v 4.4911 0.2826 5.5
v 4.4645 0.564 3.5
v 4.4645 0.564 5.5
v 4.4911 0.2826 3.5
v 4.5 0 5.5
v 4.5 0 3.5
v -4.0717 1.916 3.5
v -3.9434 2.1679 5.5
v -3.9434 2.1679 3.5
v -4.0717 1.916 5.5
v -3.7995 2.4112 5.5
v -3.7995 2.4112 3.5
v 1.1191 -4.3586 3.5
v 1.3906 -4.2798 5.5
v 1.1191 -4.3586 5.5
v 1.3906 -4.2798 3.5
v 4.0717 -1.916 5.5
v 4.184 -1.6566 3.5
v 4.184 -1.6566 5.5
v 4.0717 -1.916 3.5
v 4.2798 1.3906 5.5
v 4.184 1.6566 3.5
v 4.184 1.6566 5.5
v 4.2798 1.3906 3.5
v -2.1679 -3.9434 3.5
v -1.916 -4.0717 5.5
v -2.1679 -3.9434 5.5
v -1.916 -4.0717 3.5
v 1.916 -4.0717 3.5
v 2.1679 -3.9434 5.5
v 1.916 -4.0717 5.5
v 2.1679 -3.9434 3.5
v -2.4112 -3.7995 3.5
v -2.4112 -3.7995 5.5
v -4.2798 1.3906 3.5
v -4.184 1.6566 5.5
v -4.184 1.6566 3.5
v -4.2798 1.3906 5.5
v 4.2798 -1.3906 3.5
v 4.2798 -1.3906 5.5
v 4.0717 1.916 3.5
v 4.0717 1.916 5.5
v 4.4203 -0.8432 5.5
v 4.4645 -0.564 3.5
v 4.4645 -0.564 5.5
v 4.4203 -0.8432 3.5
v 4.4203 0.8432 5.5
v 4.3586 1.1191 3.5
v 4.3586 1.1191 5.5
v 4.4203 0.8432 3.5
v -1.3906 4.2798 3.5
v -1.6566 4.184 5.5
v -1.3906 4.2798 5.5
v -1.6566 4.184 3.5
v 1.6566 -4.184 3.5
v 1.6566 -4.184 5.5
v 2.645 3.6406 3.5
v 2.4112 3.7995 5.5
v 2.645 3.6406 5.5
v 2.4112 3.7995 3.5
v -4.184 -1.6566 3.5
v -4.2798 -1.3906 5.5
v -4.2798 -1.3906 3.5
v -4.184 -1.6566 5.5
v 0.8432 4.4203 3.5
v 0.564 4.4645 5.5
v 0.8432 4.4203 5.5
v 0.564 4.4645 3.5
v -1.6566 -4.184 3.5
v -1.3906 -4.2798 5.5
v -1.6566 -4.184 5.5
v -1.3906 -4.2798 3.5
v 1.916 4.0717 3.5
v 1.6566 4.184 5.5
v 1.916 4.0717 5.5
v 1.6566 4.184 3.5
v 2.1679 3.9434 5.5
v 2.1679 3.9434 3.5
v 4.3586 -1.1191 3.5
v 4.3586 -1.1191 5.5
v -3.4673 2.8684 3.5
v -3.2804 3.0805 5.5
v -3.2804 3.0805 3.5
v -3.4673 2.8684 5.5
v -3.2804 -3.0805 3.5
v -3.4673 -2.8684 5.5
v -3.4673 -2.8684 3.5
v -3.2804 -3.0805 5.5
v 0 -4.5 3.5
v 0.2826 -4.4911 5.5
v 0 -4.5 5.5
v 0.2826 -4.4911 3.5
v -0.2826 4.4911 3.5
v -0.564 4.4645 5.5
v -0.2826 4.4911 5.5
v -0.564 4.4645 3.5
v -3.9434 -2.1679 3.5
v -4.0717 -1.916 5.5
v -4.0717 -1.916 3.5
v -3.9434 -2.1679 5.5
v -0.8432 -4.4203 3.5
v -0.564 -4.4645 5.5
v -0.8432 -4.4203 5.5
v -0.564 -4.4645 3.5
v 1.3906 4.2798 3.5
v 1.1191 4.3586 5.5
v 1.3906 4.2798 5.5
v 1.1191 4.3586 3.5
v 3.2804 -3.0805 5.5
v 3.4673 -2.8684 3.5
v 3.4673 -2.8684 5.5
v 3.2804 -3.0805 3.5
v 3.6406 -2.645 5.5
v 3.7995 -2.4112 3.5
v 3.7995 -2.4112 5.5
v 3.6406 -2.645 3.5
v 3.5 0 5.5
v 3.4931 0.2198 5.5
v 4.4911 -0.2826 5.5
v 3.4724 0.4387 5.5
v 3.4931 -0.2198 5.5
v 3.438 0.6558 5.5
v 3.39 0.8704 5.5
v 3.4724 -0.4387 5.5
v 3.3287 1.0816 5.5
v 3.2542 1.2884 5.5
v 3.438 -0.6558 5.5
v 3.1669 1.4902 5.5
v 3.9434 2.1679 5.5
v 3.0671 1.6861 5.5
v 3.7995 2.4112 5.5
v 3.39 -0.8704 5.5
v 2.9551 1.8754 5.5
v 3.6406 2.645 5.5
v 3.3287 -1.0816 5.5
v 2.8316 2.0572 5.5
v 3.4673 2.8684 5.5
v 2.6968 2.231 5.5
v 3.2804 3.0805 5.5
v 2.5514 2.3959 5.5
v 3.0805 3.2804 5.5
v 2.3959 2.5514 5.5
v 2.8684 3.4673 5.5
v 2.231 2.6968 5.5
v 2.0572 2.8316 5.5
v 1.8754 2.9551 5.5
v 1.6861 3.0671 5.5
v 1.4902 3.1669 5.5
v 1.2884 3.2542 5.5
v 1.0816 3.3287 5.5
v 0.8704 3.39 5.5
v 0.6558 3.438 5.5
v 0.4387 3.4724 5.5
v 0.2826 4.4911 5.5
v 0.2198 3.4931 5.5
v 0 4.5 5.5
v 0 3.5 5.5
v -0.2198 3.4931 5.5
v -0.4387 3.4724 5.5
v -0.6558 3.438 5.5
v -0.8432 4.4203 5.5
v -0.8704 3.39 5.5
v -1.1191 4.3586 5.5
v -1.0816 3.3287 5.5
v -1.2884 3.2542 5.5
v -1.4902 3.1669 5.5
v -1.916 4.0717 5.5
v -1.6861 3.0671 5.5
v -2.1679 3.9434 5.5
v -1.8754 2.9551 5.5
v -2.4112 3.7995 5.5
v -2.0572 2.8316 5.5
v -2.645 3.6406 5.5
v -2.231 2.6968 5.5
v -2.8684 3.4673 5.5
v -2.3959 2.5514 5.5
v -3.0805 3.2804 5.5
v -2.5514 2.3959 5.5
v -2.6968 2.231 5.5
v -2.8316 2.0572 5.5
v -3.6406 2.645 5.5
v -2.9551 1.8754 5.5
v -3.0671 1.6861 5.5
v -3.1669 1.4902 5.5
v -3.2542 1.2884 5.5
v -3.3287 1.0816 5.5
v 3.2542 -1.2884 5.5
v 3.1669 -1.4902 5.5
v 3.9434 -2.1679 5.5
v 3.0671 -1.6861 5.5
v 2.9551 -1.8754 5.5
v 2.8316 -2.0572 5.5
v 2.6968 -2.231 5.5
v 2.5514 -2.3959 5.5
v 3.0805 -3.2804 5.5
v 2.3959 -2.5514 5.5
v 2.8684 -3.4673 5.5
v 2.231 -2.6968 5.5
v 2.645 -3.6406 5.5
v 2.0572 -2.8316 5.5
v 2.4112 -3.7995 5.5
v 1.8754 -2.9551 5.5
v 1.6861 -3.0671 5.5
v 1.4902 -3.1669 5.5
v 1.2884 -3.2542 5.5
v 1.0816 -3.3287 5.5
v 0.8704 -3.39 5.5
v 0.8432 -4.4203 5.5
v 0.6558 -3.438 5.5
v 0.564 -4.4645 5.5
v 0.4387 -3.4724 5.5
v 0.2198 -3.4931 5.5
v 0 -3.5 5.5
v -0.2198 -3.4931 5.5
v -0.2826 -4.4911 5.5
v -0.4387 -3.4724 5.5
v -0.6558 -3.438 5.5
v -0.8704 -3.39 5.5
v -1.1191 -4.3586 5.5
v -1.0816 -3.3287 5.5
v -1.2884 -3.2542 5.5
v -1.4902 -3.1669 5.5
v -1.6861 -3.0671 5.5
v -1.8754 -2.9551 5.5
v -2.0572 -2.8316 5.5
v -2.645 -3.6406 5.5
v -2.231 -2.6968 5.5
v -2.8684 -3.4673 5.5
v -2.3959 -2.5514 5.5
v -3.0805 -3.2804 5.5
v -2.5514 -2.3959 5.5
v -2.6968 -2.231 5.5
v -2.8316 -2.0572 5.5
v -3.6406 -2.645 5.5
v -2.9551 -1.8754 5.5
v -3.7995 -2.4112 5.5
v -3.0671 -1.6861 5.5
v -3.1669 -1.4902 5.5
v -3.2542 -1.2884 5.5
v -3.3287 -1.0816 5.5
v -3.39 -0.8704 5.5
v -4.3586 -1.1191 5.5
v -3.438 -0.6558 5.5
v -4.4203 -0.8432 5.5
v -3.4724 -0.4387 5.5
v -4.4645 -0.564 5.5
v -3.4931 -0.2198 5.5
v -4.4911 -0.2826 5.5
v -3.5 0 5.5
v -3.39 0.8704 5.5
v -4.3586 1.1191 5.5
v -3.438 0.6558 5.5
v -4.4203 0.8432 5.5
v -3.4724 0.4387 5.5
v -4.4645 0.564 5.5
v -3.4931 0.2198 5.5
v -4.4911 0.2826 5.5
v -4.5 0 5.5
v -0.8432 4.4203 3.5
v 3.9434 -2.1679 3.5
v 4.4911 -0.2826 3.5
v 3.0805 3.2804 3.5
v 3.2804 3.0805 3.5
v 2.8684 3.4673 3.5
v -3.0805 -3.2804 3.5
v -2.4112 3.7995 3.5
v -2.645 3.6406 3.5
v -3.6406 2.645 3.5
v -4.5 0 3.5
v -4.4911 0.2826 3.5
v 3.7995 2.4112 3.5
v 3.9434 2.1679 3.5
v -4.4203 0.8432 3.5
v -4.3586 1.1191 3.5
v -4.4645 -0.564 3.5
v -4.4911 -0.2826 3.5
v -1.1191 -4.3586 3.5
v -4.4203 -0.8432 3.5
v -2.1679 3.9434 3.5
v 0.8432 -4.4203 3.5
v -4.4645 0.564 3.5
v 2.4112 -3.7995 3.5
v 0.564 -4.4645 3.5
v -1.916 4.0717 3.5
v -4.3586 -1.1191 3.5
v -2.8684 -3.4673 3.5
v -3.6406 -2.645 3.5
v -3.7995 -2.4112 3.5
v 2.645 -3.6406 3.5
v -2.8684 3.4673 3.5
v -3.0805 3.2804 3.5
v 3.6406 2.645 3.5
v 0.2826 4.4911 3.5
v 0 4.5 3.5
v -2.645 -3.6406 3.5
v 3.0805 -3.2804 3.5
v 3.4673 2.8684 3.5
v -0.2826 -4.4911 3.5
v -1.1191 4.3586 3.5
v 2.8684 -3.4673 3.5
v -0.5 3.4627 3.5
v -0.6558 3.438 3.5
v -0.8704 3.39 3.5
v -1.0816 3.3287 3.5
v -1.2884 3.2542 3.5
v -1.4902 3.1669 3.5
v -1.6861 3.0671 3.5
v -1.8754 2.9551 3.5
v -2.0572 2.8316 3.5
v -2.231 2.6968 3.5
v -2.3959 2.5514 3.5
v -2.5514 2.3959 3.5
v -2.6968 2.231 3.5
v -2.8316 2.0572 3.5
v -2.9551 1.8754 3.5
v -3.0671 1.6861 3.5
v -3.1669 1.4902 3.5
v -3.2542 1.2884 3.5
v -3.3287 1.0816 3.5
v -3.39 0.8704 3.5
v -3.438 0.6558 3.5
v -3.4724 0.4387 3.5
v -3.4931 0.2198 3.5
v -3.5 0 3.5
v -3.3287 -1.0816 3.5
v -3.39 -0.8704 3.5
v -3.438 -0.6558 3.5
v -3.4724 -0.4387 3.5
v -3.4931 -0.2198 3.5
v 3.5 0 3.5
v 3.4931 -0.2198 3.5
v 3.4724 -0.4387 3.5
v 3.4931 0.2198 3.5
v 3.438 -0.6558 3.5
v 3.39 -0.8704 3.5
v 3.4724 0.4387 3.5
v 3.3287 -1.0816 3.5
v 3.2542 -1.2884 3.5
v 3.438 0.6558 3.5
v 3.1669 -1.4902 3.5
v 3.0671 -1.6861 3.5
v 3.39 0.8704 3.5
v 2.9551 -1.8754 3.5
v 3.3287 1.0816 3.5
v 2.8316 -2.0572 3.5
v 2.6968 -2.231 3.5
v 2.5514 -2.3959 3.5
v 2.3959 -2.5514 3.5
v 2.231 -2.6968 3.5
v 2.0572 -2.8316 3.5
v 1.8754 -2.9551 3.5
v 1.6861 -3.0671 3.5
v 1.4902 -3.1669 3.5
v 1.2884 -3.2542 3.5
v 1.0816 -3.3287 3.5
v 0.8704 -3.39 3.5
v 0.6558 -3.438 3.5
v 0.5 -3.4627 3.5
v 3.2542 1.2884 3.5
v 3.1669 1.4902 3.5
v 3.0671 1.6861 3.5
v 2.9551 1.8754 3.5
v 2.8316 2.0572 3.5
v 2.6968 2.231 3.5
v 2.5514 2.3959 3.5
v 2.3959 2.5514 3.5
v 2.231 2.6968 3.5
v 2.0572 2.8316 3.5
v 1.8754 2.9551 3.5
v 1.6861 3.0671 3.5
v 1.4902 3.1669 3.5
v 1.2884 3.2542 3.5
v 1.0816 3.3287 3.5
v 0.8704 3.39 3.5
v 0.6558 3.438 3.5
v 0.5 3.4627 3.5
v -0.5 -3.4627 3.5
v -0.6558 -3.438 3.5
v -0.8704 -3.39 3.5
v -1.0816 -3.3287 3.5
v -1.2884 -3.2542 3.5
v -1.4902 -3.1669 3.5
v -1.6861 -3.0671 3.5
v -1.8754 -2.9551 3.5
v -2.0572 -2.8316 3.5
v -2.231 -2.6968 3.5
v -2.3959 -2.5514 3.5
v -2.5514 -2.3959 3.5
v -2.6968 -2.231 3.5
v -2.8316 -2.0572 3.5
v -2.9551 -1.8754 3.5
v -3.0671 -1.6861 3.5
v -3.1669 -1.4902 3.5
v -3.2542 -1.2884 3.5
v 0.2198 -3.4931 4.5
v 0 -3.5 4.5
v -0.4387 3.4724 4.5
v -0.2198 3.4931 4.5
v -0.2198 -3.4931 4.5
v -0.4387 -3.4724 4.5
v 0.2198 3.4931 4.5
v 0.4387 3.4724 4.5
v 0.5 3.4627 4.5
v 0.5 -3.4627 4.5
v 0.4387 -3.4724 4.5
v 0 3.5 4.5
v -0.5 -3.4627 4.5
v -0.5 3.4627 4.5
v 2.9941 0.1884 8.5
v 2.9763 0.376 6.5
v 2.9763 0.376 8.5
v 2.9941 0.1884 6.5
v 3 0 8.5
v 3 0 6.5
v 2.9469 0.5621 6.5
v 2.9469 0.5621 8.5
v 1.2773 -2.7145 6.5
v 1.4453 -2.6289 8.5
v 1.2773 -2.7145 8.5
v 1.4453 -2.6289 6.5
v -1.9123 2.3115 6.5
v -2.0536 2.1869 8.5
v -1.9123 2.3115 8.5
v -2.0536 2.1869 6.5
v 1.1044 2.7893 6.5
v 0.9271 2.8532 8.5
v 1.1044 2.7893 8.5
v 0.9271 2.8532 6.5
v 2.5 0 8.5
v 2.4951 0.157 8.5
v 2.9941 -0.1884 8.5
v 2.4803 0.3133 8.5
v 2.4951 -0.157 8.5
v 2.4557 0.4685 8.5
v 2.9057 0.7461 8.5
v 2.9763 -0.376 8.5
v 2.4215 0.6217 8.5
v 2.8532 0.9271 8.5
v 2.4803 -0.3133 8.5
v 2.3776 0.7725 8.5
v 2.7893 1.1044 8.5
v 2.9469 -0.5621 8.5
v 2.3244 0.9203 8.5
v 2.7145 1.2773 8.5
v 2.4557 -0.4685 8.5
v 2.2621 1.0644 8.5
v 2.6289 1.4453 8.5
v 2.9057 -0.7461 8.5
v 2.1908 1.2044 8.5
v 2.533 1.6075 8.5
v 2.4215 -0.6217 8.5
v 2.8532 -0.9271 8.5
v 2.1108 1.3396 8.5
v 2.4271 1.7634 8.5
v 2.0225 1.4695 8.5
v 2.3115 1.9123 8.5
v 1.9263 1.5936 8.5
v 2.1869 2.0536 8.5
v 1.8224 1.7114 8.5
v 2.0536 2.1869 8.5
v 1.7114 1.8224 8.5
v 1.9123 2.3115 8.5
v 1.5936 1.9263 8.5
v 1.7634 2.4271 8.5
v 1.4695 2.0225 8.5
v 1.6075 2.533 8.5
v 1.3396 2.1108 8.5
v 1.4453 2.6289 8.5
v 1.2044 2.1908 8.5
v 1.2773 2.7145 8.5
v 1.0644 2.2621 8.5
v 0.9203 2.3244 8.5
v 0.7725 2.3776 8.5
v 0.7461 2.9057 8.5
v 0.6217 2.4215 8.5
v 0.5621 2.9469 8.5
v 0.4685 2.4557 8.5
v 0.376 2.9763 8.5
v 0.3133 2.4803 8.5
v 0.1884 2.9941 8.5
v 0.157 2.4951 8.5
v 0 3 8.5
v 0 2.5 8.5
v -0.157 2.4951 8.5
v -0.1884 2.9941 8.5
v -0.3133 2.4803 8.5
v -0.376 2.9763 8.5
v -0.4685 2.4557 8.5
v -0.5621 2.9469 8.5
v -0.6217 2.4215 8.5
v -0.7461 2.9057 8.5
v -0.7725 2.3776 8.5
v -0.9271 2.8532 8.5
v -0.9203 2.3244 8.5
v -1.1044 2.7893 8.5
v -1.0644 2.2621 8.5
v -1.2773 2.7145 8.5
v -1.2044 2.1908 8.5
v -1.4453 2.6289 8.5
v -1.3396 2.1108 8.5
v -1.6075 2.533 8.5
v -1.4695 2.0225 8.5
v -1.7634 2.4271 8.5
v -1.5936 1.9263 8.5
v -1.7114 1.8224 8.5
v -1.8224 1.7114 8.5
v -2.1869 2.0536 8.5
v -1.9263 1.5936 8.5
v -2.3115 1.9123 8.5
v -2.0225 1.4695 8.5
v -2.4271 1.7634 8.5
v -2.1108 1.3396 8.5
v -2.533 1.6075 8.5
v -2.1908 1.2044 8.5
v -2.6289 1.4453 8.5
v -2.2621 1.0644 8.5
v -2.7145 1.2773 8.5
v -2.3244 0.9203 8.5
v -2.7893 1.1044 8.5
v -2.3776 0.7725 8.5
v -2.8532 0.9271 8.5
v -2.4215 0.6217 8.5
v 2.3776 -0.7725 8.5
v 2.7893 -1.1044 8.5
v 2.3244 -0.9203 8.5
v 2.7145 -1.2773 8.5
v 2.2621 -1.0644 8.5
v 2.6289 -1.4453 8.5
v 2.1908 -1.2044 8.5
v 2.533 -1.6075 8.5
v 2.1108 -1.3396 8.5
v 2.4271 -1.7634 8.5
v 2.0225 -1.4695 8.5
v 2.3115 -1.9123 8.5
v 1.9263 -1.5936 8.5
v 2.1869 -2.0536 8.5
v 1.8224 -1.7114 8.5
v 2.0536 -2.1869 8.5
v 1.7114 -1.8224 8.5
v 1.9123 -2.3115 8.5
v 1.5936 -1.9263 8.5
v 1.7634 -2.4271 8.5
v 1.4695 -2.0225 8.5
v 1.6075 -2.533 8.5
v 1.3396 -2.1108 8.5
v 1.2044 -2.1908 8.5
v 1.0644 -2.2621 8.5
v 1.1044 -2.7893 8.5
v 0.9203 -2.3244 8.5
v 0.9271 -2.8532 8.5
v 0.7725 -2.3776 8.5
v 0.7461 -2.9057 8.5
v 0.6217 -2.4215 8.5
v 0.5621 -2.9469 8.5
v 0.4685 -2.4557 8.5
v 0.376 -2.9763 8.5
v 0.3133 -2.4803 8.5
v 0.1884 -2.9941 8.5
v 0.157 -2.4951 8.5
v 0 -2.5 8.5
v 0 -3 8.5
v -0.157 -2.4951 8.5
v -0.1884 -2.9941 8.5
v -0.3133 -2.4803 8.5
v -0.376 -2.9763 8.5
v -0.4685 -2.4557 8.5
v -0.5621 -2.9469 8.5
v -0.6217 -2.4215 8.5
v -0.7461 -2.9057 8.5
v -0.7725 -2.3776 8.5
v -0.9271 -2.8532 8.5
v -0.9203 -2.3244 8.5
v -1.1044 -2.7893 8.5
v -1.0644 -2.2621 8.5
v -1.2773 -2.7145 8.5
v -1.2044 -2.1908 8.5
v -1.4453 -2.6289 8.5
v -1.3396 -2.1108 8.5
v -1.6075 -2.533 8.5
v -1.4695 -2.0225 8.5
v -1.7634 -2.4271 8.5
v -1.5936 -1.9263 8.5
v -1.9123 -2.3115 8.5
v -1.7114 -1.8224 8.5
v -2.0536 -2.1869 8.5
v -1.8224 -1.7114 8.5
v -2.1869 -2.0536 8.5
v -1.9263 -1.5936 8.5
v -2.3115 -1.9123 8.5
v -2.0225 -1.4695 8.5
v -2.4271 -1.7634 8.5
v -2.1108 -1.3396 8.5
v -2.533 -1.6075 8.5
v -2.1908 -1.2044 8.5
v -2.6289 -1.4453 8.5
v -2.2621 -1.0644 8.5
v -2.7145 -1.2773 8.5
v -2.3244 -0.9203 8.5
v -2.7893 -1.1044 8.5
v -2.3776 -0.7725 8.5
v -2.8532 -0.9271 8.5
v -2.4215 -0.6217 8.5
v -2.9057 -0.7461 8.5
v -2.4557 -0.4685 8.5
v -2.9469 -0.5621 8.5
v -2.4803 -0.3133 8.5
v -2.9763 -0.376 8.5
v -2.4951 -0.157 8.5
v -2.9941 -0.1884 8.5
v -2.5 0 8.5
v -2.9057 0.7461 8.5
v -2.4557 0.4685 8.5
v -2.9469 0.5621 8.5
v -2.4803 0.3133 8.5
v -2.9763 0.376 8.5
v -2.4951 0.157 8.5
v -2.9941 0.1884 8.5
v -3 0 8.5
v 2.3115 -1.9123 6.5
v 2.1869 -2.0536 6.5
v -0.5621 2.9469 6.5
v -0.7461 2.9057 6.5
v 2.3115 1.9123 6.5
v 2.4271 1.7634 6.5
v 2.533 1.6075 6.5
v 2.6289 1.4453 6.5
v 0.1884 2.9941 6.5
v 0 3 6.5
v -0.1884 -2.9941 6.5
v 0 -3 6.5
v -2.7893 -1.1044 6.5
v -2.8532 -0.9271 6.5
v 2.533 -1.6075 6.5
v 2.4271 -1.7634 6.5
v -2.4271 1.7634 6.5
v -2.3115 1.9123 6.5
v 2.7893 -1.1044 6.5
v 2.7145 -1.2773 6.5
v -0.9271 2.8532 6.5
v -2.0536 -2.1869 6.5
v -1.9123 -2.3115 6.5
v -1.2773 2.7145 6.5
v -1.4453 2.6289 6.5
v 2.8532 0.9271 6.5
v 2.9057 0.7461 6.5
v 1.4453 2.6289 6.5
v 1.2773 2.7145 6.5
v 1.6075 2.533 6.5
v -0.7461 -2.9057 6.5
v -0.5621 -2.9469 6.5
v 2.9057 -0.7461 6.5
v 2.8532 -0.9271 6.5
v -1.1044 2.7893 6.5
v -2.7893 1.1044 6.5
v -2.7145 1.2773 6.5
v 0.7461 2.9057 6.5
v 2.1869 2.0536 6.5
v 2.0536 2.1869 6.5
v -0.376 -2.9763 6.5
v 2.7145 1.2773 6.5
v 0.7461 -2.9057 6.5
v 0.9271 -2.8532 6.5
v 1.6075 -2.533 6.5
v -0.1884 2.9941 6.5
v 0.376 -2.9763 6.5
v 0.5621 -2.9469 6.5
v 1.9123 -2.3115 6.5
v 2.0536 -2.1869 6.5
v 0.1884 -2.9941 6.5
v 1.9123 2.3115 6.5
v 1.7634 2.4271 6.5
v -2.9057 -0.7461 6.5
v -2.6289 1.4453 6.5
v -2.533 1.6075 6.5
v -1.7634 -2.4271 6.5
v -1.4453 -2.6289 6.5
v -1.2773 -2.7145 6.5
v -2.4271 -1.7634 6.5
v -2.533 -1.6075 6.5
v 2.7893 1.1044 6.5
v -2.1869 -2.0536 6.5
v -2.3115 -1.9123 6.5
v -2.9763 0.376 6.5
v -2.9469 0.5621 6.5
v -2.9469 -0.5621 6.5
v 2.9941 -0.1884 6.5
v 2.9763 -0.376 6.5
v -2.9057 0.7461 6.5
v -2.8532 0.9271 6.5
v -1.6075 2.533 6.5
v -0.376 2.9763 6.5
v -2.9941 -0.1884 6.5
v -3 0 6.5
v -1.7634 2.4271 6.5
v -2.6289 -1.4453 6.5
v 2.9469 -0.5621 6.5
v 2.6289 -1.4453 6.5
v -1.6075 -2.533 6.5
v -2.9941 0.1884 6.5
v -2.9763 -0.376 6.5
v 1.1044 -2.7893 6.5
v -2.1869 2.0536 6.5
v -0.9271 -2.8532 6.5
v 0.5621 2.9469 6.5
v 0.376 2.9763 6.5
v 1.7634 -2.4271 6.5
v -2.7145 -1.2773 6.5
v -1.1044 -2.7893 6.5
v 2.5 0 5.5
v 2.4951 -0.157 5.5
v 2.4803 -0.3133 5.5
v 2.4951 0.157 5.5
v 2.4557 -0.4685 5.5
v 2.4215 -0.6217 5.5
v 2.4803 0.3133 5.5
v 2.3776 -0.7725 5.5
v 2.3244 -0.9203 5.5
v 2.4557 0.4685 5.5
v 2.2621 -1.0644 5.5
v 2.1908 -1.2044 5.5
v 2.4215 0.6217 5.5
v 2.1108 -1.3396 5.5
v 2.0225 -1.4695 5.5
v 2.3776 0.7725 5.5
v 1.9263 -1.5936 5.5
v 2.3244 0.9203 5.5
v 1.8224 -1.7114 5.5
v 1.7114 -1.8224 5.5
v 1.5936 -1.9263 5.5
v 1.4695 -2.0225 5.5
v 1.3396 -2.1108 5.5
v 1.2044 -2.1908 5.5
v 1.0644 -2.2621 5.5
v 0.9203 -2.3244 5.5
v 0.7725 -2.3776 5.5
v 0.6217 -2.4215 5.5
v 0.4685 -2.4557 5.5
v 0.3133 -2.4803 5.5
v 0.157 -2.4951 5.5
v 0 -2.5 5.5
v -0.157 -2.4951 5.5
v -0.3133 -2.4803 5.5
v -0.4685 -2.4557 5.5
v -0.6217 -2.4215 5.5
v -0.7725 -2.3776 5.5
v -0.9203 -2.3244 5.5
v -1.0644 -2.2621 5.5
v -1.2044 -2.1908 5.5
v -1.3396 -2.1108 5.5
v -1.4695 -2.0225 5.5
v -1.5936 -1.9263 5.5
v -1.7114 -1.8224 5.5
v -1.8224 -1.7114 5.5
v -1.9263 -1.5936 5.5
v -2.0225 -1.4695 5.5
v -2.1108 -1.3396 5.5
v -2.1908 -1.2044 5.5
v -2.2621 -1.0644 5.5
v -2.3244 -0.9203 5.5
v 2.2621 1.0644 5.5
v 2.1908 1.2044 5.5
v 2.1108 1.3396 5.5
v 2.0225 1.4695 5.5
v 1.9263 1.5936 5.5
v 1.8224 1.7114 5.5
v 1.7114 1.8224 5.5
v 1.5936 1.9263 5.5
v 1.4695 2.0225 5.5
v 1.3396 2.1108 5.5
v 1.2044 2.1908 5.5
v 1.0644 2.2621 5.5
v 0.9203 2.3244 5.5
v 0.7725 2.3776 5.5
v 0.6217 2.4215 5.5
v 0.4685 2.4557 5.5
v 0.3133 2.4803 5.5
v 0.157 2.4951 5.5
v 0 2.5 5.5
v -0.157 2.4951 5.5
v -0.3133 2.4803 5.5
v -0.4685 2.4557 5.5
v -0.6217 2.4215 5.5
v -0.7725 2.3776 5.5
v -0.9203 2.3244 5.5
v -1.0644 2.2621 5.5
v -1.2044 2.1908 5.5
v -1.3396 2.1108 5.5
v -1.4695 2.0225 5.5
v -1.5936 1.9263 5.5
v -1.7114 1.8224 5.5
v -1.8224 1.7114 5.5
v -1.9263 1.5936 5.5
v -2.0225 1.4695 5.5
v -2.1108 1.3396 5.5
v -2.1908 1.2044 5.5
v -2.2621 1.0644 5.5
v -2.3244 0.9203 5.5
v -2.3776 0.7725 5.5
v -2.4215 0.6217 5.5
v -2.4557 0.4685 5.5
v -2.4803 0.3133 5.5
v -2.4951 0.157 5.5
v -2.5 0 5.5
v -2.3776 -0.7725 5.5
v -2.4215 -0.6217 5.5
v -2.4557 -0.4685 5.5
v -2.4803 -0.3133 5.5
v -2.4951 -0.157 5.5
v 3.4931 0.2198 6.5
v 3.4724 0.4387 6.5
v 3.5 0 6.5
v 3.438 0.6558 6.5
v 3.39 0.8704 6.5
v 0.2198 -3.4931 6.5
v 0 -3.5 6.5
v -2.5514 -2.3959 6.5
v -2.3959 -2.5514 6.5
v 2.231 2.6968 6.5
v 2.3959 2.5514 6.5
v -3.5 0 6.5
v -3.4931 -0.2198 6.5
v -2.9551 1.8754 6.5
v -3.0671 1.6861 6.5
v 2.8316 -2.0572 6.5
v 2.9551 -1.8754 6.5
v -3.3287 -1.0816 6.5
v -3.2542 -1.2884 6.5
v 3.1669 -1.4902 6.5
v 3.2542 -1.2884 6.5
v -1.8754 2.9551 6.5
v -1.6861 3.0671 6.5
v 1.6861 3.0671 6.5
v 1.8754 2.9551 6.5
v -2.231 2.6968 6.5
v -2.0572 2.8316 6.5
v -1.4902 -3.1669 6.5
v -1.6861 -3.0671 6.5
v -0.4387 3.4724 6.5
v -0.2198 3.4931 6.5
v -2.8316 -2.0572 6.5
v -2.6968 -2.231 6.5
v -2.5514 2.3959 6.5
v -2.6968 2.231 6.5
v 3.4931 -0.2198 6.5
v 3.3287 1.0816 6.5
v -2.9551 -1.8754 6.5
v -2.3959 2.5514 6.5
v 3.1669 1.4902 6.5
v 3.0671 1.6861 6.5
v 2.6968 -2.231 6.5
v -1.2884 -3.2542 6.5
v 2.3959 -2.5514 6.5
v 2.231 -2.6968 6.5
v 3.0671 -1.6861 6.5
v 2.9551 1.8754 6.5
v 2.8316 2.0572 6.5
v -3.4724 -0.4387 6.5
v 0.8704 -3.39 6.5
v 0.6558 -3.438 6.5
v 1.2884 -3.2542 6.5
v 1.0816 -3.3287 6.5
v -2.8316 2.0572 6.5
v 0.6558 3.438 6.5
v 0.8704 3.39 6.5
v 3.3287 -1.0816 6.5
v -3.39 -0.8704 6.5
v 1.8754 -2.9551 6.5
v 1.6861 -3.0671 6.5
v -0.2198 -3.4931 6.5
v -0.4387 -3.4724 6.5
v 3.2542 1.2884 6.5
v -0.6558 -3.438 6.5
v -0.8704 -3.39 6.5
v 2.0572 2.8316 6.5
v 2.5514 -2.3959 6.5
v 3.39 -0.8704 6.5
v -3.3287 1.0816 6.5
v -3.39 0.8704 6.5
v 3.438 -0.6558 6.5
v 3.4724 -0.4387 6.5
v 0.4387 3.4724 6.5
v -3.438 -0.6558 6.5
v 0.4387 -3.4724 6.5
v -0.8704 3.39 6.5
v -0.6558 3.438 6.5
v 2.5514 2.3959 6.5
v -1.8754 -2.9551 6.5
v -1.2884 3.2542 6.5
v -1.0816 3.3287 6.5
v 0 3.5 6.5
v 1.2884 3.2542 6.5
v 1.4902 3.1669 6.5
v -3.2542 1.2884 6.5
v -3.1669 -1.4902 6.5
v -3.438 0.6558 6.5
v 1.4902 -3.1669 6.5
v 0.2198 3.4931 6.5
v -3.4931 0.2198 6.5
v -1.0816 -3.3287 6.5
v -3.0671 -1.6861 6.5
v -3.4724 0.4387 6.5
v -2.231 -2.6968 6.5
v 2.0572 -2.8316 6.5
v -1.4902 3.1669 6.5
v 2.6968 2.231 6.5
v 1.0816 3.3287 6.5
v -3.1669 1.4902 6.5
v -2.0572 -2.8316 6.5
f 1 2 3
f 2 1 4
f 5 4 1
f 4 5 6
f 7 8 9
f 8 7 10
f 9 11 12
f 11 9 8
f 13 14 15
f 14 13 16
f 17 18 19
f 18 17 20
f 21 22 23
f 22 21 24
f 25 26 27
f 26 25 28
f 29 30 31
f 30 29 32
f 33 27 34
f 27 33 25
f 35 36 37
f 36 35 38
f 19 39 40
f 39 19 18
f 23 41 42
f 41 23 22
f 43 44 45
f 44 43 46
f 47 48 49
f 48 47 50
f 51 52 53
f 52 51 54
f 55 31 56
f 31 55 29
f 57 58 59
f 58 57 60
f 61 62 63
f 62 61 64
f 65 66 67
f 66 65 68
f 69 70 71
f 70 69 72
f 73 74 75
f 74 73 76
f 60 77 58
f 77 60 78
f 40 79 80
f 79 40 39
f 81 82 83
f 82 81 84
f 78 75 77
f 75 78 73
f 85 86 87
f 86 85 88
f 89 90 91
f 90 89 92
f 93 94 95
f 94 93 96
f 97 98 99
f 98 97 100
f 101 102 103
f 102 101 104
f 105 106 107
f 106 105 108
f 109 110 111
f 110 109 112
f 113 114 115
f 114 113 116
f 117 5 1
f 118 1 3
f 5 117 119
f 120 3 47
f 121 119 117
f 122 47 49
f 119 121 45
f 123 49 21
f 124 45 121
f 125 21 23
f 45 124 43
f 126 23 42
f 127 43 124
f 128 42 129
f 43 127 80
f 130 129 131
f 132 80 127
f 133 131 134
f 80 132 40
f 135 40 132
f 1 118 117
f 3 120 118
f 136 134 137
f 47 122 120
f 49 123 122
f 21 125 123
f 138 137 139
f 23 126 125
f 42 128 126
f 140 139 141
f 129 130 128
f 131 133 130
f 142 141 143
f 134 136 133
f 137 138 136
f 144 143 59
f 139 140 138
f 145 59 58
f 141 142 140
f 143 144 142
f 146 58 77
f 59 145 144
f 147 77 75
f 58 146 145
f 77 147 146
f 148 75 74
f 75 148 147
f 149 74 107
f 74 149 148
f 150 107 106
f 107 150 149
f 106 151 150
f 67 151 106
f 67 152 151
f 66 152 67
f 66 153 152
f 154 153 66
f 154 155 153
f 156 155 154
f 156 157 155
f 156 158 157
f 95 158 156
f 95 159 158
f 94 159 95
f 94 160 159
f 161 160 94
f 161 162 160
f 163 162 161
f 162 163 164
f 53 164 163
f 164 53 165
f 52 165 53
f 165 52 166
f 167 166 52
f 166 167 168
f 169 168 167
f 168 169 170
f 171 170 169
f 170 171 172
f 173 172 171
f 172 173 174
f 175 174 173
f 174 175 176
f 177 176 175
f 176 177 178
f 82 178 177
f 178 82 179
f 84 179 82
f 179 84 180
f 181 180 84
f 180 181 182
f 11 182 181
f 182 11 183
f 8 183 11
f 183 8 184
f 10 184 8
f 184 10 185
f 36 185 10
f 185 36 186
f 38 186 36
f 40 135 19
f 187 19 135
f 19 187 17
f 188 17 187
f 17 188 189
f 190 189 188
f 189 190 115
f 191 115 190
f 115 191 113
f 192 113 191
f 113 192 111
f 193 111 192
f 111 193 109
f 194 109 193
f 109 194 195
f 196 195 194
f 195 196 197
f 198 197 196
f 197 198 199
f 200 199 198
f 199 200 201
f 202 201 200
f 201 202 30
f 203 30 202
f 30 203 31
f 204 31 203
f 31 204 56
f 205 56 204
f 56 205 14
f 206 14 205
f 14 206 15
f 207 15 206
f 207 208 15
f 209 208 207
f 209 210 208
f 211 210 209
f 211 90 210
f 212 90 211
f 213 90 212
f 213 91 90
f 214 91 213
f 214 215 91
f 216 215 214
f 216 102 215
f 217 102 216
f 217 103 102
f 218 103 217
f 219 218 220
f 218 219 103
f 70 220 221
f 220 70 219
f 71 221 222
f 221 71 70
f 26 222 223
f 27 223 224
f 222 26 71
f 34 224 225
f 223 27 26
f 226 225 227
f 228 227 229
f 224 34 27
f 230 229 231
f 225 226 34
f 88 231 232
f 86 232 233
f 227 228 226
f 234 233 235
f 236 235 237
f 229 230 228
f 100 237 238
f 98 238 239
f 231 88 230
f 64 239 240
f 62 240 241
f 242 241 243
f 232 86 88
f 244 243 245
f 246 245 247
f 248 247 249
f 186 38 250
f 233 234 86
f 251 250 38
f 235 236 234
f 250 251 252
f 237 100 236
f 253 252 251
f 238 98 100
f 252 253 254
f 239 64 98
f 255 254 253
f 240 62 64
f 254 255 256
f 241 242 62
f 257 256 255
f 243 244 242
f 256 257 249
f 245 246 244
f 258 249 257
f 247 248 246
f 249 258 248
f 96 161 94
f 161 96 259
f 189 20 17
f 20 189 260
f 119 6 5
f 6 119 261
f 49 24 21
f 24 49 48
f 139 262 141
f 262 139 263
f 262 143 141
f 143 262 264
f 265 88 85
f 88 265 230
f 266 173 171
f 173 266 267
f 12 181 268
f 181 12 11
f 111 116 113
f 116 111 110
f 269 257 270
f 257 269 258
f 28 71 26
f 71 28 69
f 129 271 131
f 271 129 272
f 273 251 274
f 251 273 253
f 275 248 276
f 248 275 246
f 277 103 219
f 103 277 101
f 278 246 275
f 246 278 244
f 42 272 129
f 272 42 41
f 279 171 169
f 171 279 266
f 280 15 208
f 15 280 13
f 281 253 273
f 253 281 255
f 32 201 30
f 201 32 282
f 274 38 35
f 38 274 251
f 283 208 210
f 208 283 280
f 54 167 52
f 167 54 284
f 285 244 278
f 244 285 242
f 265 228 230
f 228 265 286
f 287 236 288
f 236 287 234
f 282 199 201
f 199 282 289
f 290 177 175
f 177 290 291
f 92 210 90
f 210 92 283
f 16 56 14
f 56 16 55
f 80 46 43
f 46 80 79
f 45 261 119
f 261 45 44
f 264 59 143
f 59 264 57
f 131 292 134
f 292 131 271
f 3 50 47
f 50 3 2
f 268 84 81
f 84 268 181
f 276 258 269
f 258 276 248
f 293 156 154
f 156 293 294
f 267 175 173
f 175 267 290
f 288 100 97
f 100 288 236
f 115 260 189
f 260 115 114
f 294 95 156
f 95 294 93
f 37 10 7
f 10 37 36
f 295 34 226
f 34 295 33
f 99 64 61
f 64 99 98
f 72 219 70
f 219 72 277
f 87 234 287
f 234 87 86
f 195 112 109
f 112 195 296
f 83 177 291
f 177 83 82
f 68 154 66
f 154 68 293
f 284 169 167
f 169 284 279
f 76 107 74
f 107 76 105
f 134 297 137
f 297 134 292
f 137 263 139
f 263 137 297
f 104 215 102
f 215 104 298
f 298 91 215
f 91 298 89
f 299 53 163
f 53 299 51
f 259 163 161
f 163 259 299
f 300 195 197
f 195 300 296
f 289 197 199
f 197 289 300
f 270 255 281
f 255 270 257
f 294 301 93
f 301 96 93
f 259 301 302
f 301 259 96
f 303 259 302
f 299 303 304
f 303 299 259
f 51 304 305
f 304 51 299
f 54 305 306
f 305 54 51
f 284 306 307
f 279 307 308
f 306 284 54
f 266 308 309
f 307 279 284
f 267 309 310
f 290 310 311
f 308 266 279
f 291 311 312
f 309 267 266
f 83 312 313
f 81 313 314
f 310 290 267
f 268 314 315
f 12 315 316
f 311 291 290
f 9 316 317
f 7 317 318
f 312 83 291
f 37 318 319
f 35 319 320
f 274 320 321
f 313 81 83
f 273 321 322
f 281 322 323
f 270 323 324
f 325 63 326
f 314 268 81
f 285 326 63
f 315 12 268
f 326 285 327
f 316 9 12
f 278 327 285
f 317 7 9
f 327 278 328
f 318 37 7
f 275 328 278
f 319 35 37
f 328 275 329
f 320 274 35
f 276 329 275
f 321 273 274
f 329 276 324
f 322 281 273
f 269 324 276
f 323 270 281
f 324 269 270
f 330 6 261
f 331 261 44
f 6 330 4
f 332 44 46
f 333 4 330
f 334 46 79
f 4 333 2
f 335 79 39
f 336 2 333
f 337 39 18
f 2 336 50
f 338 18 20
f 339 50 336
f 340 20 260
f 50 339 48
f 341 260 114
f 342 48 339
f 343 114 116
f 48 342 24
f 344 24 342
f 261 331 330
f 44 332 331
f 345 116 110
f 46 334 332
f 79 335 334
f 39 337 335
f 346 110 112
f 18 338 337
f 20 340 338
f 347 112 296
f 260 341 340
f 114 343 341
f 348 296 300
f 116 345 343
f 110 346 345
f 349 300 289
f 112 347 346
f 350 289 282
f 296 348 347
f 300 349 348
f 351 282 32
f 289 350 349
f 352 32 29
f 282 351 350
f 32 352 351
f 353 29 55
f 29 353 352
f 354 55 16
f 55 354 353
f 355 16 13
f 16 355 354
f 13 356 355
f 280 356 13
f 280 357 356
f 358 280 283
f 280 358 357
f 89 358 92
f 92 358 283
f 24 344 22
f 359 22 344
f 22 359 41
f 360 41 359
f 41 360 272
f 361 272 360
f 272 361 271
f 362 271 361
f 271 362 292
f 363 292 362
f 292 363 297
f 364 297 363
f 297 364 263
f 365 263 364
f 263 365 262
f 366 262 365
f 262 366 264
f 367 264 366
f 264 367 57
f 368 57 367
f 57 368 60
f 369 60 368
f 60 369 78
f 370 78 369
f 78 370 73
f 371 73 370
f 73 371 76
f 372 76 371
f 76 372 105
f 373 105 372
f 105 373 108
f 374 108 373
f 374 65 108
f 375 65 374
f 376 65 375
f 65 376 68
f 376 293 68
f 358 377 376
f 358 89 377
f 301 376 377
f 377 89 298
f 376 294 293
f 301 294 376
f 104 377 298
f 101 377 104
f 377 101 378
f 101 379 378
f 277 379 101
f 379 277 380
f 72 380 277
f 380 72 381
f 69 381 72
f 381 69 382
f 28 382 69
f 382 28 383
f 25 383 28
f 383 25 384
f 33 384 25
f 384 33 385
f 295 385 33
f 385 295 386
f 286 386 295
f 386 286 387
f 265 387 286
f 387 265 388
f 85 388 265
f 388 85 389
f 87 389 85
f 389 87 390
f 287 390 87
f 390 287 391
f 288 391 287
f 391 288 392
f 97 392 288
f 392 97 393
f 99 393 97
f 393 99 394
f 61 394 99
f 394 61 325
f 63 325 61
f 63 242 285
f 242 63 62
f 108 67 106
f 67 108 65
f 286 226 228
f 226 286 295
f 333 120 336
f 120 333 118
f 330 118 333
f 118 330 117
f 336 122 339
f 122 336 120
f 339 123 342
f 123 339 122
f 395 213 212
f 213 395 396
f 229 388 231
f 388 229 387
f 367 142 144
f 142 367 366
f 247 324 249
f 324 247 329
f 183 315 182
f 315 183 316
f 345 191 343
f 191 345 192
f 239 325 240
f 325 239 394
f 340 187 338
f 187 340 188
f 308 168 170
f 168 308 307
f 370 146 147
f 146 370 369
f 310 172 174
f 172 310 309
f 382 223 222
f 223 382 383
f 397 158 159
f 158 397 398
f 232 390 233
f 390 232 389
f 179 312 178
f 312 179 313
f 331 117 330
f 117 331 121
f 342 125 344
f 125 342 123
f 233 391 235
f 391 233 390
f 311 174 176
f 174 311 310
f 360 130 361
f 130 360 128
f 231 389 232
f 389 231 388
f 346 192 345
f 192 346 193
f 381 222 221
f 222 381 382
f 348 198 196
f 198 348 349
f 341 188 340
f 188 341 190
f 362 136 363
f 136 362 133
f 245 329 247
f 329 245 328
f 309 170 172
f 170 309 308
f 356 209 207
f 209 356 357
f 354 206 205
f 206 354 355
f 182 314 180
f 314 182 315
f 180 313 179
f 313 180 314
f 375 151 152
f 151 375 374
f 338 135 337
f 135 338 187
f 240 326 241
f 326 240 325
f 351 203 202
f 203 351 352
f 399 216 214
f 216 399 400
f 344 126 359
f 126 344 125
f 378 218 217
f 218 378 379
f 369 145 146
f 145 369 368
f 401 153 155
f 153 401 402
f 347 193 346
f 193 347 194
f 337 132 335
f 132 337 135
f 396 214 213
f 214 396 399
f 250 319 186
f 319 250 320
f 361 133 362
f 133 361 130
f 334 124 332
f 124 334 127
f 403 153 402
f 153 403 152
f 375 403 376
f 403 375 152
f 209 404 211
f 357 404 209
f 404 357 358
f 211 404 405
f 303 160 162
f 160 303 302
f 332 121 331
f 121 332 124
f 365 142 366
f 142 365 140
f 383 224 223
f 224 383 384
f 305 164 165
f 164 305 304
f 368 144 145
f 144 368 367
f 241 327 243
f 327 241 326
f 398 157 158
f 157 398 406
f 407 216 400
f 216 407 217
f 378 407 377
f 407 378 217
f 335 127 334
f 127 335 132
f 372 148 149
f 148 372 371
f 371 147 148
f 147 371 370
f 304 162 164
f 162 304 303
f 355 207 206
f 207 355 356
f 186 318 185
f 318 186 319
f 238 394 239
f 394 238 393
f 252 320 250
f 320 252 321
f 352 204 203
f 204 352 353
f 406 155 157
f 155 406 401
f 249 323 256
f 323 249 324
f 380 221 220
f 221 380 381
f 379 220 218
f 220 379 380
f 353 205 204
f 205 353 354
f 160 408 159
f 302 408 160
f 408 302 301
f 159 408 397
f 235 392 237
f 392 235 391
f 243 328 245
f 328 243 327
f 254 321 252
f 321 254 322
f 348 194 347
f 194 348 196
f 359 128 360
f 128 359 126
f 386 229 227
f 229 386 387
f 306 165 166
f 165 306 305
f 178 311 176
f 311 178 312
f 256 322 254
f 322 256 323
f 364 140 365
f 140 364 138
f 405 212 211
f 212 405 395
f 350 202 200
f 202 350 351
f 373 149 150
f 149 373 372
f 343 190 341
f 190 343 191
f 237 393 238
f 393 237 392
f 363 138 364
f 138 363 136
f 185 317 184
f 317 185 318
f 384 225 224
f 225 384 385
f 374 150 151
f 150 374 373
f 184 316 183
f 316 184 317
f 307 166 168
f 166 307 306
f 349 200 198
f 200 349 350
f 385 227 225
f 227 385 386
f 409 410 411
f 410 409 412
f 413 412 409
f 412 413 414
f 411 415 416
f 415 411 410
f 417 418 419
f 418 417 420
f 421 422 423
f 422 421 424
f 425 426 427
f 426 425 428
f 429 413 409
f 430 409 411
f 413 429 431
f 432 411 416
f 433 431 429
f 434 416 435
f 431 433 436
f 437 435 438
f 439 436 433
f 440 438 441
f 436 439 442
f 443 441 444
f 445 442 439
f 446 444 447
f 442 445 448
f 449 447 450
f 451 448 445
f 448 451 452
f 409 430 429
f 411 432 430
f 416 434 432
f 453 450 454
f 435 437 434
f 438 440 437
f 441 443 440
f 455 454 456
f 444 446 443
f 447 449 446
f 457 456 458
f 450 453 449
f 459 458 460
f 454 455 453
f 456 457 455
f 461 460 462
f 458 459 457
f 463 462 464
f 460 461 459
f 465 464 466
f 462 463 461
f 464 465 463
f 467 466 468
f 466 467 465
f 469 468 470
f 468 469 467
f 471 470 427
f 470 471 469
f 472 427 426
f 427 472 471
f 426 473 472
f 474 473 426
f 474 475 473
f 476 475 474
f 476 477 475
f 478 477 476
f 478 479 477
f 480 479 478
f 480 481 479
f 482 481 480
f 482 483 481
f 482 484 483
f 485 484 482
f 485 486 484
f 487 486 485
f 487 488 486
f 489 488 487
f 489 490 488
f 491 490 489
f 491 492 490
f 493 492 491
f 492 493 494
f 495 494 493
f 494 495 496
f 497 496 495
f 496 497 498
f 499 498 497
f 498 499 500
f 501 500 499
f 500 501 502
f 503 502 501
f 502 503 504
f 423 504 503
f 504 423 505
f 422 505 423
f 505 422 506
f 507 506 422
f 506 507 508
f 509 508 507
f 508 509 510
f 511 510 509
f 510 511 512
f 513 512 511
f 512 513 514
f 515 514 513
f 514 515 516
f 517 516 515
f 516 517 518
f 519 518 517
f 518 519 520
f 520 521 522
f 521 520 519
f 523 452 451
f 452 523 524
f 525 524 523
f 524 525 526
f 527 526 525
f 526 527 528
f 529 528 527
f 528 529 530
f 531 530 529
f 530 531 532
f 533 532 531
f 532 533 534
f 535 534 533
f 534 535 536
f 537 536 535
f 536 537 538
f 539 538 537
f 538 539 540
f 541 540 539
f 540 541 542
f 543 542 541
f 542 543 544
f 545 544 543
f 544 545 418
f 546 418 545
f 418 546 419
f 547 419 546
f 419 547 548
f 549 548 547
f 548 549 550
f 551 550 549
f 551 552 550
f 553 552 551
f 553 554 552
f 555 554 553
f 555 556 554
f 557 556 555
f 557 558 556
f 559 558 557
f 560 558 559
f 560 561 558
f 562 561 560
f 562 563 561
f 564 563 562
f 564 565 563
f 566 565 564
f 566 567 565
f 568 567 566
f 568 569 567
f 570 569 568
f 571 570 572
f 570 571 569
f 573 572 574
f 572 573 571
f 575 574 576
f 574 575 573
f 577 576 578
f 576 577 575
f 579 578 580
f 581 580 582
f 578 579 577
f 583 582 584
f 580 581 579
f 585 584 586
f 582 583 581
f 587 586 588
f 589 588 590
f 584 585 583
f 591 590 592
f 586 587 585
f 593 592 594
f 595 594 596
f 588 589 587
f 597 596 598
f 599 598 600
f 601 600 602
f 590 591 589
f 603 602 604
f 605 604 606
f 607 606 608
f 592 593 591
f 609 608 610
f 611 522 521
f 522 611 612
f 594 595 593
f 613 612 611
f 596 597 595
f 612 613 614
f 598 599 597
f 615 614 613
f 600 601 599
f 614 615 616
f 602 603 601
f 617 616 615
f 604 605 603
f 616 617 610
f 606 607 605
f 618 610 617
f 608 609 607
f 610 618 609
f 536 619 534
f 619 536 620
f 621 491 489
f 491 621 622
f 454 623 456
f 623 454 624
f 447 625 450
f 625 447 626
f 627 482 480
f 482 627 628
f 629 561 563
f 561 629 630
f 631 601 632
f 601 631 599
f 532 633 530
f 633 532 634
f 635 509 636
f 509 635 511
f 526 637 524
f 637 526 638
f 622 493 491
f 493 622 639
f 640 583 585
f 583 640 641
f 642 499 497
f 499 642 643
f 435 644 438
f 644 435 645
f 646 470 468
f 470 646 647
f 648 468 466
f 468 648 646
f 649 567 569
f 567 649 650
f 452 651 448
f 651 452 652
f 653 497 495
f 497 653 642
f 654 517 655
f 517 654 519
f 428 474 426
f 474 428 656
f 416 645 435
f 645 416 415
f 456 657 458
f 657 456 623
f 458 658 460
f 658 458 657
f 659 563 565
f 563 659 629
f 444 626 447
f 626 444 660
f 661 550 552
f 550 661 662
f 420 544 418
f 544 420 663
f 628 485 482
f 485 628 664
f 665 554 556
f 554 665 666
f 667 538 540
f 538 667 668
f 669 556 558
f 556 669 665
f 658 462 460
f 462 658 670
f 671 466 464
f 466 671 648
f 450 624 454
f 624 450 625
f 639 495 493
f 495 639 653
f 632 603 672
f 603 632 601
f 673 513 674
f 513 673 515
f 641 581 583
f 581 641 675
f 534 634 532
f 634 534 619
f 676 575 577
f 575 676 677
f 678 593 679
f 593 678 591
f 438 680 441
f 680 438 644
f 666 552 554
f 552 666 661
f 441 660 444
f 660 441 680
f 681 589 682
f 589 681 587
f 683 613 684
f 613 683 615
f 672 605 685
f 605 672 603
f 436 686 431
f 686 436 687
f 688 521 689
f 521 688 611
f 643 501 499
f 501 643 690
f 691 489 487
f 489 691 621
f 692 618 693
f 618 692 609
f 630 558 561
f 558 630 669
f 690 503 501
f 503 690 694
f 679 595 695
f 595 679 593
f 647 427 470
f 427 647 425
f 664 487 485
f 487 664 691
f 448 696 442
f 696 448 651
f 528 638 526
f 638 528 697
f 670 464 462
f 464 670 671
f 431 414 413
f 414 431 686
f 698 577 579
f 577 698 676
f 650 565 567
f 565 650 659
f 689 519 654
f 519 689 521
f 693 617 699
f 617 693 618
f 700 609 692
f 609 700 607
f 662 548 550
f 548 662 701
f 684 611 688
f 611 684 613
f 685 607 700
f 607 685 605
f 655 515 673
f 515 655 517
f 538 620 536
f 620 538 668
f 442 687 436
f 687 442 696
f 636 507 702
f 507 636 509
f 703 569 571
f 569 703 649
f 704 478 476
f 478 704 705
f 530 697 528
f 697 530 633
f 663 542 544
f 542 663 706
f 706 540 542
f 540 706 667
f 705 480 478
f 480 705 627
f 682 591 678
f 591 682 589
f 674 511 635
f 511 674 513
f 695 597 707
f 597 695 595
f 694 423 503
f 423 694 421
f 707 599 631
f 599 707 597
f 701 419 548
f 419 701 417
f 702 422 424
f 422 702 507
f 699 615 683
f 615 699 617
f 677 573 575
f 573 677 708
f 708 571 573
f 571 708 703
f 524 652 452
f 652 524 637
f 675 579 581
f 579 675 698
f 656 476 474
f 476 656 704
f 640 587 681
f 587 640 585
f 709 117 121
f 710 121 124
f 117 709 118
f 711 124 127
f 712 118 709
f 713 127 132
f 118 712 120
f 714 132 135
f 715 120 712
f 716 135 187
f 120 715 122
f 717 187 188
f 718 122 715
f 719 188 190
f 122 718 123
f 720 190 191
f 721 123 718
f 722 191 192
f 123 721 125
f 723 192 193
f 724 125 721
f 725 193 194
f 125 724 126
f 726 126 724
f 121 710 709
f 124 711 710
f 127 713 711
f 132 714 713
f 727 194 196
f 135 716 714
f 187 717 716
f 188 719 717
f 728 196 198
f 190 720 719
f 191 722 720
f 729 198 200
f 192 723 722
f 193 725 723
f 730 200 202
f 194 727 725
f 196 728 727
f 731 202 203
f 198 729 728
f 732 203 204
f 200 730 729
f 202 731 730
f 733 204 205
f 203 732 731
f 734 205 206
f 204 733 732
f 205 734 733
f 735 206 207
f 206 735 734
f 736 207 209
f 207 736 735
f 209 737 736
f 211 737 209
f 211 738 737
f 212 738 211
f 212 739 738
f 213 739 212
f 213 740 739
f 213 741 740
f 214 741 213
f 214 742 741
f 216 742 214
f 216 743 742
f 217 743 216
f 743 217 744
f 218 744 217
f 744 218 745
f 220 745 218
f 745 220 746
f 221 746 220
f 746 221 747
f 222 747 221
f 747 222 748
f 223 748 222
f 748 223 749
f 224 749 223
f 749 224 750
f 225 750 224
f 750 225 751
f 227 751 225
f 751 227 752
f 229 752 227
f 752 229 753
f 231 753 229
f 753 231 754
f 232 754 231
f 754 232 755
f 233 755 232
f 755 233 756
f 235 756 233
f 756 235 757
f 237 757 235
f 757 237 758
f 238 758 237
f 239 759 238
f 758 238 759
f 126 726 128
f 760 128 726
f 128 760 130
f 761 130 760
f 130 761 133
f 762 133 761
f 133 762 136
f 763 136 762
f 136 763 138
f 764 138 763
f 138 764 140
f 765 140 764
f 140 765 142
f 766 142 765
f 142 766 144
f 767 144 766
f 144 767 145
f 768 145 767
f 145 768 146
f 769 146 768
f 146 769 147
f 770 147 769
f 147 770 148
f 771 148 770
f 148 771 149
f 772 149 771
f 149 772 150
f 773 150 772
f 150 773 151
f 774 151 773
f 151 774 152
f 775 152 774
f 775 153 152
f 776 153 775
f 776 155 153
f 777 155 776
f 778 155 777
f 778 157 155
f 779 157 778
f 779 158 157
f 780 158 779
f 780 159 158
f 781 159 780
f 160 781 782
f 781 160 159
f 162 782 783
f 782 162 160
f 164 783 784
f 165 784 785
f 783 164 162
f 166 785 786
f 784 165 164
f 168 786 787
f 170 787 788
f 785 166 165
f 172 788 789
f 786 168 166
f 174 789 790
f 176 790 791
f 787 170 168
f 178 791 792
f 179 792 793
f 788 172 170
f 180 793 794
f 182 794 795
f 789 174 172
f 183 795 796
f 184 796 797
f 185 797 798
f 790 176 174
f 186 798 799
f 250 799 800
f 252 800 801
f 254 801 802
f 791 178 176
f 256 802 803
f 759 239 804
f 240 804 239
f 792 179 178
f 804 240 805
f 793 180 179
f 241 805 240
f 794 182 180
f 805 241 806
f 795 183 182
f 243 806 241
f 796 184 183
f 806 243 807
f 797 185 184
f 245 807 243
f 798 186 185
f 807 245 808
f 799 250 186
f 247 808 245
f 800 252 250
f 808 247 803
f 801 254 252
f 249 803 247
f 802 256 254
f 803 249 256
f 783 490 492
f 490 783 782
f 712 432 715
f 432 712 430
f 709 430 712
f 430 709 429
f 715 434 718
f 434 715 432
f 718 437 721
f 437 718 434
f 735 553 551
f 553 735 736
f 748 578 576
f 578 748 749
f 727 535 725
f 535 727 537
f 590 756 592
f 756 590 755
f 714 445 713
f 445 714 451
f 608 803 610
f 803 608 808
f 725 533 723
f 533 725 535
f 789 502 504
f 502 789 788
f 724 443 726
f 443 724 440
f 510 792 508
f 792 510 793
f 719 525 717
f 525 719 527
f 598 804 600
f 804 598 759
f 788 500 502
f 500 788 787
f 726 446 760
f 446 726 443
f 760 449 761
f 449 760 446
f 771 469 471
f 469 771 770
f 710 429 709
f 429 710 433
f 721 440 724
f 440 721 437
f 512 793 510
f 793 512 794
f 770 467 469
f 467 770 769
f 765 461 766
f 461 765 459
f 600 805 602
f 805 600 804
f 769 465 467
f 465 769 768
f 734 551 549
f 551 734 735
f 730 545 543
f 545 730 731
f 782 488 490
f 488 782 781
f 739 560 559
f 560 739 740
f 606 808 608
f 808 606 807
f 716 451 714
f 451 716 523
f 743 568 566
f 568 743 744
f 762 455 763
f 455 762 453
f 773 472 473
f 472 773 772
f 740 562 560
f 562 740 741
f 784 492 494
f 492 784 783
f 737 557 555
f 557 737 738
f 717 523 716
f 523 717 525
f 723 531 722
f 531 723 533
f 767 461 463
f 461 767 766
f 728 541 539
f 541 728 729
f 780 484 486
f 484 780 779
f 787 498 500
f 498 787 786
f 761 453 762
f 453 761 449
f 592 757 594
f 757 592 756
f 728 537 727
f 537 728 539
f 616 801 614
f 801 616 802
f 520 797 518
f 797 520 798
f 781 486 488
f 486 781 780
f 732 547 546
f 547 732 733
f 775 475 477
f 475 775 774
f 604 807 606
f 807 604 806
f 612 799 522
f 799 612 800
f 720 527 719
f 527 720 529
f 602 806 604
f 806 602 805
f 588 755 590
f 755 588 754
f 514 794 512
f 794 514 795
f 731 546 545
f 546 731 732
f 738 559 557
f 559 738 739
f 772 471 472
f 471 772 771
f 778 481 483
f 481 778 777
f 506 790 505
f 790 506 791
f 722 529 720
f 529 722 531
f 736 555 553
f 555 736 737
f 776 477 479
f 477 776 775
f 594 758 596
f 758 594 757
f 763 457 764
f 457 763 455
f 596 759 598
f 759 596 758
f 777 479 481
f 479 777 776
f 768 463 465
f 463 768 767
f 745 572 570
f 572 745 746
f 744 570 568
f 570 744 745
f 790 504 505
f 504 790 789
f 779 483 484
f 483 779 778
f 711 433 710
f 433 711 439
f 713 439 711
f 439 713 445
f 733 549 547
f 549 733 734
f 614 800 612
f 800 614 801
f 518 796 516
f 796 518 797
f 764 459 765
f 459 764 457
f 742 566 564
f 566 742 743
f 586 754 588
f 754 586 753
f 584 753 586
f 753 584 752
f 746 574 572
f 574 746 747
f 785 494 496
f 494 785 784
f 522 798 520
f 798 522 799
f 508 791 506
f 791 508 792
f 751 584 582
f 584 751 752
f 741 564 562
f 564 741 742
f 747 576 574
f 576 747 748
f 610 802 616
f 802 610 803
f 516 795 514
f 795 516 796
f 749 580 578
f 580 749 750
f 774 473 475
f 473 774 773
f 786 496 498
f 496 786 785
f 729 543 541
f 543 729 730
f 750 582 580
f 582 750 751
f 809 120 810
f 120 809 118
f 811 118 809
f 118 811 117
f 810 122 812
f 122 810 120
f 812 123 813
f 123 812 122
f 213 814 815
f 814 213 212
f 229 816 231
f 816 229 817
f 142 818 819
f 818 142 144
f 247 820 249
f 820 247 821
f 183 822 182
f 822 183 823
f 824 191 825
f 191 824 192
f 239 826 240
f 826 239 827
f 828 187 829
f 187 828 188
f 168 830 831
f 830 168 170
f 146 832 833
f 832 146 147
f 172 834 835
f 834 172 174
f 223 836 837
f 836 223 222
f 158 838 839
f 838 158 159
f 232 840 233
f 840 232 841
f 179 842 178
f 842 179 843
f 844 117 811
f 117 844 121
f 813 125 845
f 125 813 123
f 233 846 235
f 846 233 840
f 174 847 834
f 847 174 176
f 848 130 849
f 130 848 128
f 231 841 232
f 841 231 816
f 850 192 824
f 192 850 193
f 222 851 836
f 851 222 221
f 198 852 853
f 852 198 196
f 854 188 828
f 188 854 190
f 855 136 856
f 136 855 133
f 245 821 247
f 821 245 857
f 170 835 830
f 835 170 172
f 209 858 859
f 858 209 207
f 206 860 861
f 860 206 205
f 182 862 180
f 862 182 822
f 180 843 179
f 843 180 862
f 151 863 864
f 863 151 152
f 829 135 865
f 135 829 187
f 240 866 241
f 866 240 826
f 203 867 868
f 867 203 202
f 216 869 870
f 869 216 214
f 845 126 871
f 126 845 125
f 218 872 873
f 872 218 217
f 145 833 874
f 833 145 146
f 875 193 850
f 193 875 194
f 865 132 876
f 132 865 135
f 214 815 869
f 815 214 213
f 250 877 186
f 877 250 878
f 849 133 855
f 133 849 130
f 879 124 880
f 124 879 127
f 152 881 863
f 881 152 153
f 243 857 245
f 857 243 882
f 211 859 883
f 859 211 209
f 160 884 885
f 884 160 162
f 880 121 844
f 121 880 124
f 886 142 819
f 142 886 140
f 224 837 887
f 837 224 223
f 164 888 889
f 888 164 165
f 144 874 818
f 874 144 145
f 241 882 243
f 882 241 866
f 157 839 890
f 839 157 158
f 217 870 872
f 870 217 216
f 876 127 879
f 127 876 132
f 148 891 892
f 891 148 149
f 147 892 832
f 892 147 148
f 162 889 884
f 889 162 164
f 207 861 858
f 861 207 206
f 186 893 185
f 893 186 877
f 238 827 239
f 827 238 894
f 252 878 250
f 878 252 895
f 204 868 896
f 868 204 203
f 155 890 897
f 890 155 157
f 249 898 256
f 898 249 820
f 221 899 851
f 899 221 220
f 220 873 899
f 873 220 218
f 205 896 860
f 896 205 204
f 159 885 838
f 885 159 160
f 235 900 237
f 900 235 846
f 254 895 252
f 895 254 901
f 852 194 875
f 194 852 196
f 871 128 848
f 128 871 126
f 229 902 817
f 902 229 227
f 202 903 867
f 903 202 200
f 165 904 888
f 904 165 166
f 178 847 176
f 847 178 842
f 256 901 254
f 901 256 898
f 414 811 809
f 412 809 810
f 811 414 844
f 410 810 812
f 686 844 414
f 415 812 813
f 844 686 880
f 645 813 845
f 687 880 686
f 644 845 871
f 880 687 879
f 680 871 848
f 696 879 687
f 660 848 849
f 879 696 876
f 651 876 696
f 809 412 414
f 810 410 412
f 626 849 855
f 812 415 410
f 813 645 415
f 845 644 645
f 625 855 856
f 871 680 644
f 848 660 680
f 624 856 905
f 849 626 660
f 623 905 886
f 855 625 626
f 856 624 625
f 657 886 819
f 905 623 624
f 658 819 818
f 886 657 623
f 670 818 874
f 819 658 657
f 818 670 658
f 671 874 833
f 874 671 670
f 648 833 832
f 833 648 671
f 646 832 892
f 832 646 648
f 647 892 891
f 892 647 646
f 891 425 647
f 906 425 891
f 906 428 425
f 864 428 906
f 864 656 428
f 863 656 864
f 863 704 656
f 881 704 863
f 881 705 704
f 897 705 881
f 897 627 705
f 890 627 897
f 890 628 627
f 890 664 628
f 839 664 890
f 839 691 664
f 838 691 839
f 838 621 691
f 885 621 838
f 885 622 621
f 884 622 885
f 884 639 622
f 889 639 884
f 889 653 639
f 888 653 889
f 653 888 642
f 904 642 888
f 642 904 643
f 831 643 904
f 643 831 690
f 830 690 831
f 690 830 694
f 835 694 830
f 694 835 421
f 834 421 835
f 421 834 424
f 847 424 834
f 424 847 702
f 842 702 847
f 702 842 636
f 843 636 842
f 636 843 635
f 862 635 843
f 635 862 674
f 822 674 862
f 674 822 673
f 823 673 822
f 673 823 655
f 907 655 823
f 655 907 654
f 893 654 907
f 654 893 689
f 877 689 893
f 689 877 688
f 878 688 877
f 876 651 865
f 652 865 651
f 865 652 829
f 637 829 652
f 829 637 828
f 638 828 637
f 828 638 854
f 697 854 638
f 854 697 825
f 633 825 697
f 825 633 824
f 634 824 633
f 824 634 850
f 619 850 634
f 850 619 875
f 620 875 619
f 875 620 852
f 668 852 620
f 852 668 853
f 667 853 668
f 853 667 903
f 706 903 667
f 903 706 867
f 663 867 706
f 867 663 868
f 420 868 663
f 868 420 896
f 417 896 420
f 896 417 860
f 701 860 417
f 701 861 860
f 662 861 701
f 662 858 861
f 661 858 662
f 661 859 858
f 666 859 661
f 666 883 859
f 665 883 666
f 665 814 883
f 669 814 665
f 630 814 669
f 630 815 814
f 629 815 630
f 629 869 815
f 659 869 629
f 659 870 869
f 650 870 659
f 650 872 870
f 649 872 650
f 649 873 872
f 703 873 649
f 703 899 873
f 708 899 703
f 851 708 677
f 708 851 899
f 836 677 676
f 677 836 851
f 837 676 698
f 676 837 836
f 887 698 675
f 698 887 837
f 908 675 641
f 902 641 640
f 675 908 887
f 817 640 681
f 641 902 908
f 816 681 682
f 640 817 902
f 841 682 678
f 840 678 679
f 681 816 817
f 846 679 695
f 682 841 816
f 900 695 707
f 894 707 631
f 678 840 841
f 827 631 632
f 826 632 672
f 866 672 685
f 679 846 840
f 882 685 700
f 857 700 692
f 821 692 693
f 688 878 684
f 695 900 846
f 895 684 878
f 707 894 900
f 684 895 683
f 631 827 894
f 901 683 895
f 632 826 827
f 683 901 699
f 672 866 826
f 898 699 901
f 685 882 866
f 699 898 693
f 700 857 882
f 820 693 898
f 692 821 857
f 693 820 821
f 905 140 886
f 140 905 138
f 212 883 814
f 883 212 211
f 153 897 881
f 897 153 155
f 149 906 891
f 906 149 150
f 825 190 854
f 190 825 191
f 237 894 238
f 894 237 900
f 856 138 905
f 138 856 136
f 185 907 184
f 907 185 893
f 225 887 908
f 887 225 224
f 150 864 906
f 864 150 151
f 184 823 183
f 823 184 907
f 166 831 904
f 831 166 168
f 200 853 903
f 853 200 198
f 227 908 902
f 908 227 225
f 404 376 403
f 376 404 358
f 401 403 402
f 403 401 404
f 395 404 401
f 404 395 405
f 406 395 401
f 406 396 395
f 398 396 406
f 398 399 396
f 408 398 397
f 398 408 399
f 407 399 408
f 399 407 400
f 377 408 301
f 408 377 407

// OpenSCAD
// Ankur Gupta
// Feb 2017
// github.com/agupta231

// Setup faces
$fn = 100;

// Parameters
straw_diameter = 5;
straw_connector_bottom_height = 5;
straw_connector_top_height = 3;
straw_connector_thicc = 1;
valve_diameter = 7;
valve_thickness = 2;
ball_diameter = 6;
ball_travel_distance = 1;
valve_connector_height = 2;
valve_height = ball_diameter + ball_travel_distance;
ring_thickness = 2;
ring_height = 2;

// Creating the top valve and straw connector
union() {
    translate([0, 0, valve_height / 2 + valve_connector_height / 2]) {
        difference() {
          cylinder(d=valve_diameter + valve_thickness, h=valve_connector_height, center=true);
          cylinder(d=valve_diameter, h=valve_connector_height + 5, center=true);
        }
    }

    translate([0, 0, valve_height / 2 + 0.5]) {
        cube([1, valve_diameter, 1], center=true);
    }

    translate([0, 0, valve_height / 2 + valve_connector_height + straw_connector_top_height / 2]) {
        difference() {
          cylinder(d=straw_diameter + straw_connector_thicc, h=straw_connector_top_height, center=true);
          cylinder(d=straw_diameter, h=straw_connector_top_height + 1, center=true);
        }
    }

    translate([0, 0, valve_height / 2 + valve_connector_height + 0.5]) {
        difference() {
            cylinder(d=valve_diameter, h=1, center=true);
            cylinder(d=straw_diameter + straw_connector_thicc, h=1.1, center=true);
        }
    }
}
